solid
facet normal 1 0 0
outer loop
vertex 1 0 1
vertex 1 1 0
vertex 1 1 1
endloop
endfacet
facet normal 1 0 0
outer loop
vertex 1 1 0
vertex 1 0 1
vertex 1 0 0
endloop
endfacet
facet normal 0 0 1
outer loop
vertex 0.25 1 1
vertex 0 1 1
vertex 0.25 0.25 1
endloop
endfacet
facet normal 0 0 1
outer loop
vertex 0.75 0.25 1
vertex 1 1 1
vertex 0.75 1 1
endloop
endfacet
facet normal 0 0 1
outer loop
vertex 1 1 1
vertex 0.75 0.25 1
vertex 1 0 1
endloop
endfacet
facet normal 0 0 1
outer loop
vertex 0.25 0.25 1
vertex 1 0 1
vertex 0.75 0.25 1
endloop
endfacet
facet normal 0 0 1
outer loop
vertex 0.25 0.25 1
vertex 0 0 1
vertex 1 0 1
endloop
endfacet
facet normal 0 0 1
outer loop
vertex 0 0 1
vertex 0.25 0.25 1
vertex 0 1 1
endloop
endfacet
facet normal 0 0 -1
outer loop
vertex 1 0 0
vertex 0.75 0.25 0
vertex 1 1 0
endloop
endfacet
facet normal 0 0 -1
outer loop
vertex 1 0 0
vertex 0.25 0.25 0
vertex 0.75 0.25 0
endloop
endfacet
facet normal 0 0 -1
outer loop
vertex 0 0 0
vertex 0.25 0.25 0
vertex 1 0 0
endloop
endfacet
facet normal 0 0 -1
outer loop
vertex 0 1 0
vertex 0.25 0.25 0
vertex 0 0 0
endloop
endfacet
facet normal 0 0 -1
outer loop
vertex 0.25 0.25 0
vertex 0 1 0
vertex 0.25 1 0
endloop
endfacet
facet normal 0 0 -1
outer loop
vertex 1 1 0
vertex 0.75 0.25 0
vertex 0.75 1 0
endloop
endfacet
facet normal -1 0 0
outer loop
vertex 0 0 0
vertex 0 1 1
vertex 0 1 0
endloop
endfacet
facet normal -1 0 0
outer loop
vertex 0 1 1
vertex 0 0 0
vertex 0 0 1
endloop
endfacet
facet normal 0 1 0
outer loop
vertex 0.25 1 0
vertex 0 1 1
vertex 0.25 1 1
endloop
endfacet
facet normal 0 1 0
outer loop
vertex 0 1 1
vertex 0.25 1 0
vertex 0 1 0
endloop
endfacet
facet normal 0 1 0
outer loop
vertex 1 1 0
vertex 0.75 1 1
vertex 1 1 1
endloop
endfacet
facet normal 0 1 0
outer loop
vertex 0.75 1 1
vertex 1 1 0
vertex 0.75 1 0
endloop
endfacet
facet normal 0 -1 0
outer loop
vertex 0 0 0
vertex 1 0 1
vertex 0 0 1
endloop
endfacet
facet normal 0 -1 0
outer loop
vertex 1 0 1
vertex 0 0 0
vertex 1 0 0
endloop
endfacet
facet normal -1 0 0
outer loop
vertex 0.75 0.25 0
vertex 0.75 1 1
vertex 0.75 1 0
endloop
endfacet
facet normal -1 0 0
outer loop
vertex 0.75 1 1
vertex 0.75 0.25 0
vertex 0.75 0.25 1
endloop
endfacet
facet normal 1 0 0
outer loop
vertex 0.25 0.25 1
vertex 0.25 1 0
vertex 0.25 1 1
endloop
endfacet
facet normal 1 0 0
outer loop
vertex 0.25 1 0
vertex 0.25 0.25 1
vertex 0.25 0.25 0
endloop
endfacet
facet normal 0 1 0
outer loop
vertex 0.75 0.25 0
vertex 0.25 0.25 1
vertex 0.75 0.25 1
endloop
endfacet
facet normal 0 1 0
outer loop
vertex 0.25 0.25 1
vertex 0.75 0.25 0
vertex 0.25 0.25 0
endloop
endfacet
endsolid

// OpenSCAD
difference() {
   cube();
   translate([0.25,0.25,0]) scale([0.5,1,1]) cube();
}
